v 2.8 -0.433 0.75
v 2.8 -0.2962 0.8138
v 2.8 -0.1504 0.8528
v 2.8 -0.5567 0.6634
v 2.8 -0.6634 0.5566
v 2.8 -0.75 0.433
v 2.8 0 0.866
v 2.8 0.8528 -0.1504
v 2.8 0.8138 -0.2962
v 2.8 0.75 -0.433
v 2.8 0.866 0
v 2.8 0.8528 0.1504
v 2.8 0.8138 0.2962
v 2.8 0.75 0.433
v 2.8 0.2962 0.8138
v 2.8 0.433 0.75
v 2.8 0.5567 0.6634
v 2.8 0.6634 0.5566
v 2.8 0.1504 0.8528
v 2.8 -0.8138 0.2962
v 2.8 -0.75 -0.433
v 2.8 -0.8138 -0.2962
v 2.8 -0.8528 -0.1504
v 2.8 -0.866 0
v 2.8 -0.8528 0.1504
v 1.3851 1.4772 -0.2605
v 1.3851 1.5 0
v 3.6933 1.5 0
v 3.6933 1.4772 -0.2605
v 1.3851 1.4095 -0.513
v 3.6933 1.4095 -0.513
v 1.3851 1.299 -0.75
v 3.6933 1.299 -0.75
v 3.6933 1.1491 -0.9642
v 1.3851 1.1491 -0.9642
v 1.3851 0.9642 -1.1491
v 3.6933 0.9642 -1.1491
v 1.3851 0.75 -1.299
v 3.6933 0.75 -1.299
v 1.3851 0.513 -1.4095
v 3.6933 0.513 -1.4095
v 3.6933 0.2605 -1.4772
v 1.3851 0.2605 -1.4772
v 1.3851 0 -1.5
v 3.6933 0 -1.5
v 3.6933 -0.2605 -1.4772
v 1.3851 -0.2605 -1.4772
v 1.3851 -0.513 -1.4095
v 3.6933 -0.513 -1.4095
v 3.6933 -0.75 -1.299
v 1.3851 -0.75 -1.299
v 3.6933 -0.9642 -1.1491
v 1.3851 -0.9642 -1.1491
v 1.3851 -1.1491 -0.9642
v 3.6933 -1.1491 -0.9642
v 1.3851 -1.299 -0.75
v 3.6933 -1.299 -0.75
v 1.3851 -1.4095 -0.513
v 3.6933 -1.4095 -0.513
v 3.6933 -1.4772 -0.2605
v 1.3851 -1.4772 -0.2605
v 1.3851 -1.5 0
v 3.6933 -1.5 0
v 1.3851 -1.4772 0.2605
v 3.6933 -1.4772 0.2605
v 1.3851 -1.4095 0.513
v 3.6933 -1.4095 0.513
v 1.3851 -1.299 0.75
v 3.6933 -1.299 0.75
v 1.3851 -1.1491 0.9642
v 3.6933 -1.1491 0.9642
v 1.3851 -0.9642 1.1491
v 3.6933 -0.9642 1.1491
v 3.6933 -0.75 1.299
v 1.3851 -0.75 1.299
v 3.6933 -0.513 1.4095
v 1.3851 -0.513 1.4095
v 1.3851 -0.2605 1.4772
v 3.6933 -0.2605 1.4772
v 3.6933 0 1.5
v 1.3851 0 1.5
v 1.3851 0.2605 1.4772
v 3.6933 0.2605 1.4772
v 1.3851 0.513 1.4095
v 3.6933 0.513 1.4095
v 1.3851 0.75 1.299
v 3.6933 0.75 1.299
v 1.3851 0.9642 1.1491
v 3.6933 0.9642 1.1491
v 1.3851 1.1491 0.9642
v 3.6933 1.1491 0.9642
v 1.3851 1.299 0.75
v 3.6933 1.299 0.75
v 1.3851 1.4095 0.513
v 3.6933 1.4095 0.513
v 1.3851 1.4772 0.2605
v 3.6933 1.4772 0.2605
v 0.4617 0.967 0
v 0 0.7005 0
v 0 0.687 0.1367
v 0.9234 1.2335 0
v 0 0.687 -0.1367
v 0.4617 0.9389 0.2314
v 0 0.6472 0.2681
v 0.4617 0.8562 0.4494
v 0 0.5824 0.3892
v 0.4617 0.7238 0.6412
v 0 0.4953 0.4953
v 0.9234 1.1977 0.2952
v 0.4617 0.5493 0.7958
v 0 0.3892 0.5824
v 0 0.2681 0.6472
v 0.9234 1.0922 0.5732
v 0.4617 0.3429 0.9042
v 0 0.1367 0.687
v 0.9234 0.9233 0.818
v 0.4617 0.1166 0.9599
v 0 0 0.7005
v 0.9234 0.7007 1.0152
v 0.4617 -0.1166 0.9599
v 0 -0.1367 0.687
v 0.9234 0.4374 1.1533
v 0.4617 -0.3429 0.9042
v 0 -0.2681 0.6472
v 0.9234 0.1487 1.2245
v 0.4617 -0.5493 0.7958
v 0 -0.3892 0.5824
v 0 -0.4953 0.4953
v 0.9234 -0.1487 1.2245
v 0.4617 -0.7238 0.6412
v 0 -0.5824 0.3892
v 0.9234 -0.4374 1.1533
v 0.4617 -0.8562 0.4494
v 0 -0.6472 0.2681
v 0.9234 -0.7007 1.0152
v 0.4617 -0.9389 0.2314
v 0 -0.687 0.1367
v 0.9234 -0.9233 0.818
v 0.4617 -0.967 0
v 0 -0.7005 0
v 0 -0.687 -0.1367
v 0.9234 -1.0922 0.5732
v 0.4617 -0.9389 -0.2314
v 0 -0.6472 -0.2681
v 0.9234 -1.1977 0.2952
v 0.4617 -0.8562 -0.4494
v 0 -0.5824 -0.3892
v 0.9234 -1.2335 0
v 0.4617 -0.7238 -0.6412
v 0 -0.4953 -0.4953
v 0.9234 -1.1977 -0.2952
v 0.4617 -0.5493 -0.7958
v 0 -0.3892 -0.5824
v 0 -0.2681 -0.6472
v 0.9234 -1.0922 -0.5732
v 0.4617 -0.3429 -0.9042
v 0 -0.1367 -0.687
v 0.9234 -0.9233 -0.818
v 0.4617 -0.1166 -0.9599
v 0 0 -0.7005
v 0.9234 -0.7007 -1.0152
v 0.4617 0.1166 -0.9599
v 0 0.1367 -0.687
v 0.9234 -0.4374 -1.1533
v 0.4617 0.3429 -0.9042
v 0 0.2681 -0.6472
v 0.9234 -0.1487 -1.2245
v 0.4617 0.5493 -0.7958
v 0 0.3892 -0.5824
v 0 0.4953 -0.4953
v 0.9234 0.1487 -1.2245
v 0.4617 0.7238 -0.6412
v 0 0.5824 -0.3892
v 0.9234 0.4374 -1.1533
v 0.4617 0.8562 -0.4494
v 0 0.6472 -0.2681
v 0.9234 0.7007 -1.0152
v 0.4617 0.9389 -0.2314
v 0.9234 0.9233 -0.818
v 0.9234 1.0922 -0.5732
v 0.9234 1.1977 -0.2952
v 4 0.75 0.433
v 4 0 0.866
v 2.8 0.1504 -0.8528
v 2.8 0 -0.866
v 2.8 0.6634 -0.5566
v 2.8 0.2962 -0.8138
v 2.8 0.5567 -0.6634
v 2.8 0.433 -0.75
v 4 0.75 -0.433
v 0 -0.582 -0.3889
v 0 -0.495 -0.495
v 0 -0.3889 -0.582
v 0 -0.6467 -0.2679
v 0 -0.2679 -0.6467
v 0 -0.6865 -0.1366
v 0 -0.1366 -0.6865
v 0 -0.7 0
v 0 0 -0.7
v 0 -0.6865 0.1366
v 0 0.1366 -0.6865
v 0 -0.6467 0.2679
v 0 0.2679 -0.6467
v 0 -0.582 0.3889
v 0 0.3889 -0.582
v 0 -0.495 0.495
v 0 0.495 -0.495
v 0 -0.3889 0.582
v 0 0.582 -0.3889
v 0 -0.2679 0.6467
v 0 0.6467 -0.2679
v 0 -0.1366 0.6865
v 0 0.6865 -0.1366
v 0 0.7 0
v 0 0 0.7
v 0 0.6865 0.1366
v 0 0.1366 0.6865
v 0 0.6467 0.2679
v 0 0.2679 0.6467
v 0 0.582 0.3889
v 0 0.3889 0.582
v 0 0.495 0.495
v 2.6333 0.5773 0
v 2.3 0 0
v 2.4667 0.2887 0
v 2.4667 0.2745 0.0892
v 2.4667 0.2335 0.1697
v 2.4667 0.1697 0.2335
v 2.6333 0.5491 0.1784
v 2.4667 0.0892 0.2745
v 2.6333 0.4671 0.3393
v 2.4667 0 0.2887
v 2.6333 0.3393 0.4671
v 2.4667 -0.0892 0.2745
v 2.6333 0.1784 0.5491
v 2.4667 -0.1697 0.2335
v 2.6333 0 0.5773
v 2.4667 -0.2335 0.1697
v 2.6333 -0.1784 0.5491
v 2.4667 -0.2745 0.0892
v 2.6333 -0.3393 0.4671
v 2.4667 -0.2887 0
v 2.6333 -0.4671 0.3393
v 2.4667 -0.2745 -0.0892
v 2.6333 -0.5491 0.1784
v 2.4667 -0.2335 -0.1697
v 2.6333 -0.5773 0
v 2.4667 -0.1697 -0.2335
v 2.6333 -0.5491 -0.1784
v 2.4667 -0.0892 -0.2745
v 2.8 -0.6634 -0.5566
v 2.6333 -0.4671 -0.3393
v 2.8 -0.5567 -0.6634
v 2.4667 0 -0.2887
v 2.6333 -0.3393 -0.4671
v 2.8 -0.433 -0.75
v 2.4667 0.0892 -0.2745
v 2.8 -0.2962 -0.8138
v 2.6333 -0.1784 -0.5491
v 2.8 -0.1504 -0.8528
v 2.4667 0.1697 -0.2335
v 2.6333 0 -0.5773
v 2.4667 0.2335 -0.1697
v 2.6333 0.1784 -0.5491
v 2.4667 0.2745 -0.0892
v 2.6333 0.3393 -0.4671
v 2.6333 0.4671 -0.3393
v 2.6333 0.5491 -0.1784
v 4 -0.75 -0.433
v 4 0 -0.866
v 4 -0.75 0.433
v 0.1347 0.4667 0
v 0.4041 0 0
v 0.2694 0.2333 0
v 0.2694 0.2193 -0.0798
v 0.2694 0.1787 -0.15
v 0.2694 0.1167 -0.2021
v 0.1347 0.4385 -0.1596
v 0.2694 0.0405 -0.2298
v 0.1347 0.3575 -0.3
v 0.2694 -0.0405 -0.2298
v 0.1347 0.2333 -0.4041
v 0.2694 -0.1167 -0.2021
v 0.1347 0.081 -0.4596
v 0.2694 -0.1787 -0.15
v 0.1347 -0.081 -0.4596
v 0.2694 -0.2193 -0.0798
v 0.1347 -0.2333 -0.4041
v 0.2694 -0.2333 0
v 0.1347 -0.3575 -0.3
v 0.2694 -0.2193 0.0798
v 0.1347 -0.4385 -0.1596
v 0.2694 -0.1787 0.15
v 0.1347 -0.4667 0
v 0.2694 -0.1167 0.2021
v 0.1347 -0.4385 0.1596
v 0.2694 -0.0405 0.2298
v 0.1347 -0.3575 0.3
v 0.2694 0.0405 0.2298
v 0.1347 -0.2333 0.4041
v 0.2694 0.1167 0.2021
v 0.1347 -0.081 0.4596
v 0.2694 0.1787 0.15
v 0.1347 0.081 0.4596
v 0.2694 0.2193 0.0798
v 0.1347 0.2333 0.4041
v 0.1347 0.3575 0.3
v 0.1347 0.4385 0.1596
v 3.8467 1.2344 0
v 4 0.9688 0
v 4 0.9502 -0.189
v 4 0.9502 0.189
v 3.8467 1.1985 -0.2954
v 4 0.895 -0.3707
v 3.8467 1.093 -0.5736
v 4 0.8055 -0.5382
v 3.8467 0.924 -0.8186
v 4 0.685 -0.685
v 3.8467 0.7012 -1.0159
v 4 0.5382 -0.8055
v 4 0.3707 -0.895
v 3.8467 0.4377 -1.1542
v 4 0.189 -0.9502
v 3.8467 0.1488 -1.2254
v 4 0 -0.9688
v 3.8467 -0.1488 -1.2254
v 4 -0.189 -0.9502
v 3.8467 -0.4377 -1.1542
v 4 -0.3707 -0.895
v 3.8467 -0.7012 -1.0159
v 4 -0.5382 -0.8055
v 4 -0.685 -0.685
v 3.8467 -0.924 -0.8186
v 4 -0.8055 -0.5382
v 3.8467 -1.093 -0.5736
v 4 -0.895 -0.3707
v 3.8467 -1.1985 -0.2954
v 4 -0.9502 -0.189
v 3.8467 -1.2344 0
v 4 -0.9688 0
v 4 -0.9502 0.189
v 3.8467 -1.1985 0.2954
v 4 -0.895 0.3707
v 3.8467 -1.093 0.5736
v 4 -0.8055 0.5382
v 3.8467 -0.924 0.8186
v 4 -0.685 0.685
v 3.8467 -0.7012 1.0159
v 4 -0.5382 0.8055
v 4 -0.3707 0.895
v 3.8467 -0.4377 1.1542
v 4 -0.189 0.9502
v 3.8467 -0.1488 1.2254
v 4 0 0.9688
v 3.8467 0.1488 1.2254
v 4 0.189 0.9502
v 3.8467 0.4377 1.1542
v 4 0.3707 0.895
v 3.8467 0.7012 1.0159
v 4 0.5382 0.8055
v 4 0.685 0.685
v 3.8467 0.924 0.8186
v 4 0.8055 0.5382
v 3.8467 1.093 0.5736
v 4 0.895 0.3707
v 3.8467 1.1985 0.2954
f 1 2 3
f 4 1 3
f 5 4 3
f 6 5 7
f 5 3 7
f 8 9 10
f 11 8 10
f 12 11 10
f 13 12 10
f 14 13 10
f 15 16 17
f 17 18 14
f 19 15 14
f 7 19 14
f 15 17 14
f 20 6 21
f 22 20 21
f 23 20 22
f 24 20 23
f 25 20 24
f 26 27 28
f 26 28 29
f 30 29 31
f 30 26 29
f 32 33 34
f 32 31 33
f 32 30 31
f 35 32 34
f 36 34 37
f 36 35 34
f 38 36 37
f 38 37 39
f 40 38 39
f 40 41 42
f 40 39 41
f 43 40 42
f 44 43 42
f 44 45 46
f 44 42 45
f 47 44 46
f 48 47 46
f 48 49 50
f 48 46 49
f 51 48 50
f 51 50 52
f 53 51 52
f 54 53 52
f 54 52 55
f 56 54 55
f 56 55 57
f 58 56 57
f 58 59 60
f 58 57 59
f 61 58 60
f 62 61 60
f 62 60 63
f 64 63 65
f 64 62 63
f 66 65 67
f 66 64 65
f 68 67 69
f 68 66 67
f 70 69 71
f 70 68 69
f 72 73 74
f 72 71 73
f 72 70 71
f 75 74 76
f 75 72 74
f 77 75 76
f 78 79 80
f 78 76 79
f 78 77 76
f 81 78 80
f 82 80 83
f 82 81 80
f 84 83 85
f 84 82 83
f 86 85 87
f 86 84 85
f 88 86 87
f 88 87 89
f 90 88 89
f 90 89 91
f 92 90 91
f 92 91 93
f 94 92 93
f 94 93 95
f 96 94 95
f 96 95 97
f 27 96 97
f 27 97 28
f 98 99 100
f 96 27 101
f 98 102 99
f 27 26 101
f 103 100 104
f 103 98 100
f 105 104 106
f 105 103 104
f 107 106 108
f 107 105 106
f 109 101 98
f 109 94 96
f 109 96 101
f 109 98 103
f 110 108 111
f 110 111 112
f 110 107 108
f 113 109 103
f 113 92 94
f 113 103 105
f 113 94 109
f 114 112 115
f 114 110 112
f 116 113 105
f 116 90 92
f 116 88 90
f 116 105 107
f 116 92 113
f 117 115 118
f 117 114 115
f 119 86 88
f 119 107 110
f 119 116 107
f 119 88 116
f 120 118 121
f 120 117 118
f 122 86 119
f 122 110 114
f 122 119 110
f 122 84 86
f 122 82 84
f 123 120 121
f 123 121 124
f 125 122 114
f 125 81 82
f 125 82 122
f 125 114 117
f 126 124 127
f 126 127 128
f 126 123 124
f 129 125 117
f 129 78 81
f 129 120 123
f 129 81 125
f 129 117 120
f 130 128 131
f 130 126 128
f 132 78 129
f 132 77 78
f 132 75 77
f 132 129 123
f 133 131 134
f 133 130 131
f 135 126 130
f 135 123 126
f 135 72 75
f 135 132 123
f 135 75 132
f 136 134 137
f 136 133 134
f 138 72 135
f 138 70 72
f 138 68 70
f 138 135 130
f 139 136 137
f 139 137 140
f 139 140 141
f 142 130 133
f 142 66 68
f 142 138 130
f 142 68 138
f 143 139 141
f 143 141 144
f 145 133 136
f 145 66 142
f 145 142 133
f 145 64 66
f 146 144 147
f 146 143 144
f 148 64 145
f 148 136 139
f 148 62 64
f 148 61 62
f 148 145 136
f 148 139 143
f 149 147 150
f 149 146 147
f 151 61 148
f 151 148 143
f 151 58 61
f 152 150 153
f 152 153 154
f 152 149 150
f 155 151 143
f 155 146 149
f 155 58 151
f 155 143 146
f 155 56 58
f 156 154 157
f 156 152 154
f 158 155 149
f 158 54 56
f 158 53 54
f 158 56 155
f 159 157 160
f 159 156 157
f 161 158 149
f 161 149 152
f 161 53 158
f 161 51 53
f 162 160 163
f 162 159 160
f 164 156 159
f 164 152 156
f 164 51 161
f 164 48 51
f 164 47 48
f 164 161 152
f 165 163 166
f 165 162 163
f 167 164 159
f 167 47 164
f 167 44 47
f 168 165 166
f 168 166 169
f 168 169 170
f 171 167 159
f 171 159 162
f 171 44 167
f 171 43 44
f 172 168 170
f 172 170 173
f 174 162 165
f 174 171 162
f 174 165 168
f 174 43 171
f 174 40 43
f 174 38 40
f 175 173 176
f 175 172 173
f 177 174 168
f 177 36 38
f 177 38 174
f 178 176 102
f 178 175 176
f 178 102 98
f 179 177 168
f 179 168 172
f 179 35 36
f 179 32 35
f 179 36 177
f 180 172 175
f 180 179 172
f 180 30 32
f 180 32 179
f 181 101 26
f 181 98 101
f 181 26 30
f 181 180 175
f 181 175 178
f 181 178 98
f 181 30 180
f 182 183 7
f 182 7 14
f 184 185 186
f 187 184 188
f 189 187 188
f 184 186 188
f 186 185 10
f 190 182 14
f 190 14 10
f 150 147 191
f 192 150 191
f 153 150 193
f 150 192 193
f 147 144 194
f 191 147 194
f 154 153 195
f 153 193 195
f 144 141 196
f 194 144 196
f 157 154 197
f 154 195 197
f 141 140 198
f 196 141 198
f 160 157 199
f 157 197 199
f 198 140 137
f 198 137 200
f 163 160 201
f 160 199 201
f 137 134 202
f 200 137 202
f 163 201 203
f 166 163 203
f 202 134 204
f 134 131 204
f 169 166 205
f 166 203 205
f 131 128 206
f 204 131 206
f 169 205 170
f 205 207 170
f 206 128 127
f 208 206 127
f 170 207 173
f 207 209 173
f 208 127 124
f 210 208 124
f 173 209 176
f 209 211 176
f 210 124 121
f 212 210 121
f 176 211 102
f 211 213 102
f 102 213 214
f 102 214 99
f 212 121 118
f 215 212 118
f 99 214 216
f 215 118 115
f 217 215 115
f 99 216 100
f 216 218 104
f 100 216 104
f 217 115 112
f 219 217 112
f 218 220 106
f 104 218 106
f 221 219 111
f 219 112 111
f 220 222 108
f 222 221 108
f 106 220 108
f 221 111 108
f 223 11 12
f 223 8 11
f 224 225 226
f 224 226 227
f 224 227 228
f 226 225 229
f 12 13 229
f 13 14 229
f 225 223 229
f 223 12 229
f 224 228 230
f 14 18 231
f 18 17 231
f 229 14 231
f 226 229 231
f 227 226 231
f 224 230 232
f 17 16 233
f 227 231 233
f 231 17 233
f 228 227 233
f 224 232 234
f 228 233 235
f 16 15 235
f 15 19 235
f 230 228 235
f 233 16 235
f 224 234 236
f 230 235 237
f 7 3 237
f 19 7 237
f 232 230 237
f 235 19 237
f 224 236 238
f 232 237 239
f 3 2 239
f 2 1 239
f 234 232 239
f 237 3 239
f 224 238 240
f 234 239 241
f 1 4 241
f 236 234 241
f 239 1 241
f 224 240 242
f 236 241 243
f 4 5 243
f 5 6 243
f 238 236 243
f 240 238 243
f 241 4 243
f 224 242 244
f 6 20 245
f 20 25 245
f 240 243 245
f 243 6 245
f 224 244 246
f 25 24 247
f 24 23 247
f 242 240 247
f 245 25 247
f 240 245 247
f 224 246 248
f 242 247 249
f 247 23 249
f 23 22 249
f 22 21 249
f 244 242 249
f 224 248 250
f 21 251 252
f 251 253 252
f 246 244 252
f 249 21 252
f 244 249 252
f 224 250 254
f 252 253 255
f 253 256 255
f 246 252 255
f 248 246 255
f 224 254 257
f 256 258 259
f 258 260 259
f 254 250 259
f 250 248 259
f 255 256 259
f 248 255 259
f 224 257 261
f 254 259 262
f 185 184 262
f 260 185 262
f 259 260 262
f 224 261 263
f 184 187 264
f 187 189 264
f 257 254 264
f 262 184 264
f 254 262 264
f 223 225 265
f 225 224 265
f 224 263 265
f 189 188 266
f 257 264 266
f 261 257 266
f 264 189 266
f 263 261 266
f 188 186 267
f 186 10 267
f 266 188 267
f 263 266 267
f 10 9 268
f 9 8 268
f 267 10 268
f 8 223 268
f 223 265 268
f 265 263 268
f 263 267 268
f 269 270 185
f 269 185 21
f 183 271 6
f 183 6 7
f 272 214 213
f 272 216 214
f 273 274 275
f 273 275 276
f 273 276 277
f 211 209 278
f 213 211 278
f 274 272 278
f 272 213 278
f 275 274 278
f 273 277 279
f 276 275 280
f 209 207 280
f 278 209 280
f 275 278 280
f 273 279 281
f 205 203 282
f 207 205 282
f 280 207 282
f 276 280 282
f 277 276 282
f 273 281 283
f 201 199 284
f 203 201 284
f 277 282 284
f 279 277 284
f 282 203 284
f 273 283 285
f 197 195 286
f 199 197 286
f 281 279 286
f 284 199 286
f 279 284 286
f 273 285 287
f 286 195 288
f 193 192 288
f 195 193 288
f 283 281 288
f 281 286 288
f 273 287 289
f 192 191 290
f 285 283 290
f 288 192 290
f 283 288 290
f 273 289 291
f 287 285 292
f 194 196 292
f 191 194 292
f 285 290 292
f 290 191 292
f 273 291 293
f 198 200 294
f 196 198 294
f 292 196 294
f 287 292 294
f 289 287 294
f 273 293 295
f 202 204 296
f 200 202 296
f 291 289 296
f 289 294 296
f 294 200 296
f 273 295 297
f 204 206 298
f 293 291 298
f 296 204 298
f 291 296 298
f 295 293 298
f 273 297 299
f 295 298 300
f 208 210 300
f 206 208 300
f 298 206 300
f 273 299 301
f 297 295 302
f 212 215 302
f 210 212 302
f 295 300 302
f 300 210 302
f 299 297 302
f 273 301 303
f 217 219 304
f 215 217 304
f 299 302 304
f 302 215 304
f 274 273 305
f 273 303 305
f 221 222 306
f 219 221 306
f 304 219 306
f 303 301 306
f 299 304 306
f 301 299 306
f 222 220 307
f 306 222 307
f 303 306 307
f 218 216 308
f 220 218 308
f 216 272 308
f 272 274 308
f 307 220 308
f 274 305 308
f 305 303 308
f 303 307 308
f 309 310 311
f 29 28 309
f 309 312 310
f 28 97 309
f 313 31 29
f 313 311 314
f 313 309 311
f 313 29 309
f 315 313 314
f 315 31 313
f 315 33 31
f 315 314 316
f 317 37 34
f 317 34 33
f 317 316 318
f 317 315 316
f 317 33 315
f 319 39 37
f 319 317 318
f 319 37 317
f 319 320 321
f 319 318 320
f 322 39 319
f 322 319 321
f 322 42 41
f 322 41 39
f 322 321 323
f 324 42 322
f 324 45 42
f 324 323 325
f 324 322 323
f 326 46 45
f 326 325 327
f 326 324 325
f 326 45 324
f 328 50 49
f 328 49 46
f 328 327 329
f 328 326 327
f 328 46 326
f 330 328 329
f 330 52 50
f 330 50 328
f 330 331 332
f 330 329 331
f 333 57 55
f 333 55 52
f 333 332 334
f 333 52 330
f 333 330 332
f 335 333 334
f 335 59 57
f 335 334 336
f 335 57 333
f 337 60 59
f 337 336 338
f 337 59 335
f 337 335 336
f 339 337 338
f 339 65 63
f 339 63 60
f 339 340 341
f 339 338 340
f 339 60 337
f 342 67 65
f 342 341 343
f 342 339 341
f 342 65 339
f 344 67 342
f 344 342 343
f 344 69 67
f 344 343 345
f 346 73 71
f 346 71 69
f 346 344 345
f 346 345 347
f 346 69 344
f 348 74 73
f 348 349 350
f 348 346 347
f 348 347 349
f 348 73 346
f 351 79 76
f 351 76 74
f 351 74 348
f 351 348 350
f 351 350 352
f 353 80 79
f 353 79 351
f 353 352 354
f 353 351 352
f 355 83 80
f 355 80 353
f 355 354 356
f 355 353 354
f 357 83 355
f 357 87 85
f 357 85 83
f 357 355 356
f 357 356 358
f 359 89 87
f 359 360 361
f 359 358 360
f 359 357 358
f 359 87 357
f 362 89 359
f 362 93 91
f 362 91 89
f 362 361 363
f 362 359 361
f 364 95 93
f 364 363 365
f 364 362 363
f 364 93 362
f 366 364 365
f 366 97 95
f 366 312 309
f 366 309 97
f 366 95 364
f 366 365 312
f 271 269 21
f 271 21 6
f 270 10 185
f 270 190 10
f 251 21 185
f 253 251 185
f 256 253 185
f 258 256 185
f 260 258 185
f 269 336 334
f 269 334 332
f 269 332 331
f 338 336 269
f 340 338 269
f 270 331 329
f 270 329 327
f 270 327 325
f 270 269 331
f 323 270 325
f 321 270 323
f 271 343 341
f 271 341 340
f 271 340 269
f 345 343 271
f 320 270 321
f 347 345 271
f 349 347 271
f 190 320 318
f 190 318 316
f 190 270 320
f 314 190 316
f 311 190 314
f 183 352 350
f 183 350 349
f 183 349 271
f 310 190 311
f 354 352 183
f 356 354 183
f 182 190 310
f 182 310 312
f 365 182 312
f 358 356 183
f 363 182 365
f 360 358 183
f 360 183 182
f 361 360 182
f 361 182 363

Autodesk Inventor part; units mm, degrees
ref_plane "YZ Plane" through (0, 0, 0) normal (1, 0, 0) x (0, 1, 0)
ref_plane "XZ Plane" through (0, 0, 0) normal (0, 1, 0) x (-1, 0, 0)
sketch "Sketch1" plane through (0, 0, 0) normal (0, 0, 1) x (1, 0, 0)
  line L0 (0.4041, 0) -> (2.3, 0)
  line L1 (4, 0.866) -> (4, 1.5)
  line L2 (4, 1.5) -> (0, 1.5)
  line L3 (4, 0.866) -> (2.8, 0.866)
  line L4 (2.8, 0.866) -> (2.3, 0)
  line L5 (0, 0.7) -> (0.4041, 0)
  line L6 (0, -0.3) -> (0, 1.8) projected
  line L7 (0, 0.7) -> (0, 1.5)
  point P0 (0, 0)
  dimension "d0" = 1.2
  dimension "d1" = 60
  dimension "d2" = 3
  dimension "d3" = 1.7321
  dimension "d4" = 4
  dimension "d5" = 60
  dimension "d7" = 1.4
revolve "Body" add sketch "Sketch1" angle 360 about axis through (0.4041, 0, 0) along (1, 0, 0)
sketch "Sketch2" plane through (4, 0, 0) normal (1, 0, 0) x (0, 0, -1)
  circle A0 centre (0, 0) radius 0.866 projected
  circle A1 centre (0, 0) radius 1.5 projected
  line L0 (0.866, 0) -> (0.433, -0.75)
  line L1 (0.433, -0.75) -> (-0.433, -0.75)
  line L2 (-0.433, -0.75) -> (-0.866, 0)
  line L3 (-0.866, 0) -> (-0.433, 0.75)
  line L4 (-0.433, 0.75) -> (0.433, 0.75)
  line L5 (0.433, 0.75) -> (0.866, 0)
extrude "Slot" add sketch "Sketch2" against normal blind 1.2 contours L5 A0 | A0 L0 | L4 A0 | A0 L1 | L3 A0 | A0 L2
chamfer "Chamfer1" distance 0.8 angle 60 1 edges at (0, -1.5, 0) measured on face at (0, 1.2188, -0.1197)
thread "Thread" size "M3x0.5" class "6g" standard "ISO Metric profile" length 4
chamfer "Chamfer2" distance 0.3067 angle 60 1 edges at (4, -1.5, 0) measured on face at (2.2568, 1.4806, -0.2406)
ref_plane "Work Plane1" through (2, 0, 0) normal (0, -0.5, -0.866) x (1, 0, 0)
equation "\"d0\" = INTI"
equation "\"d2\" = NND"
equation "\"d3\" = 1.1547 * SW"
equation "\"d4\" = NLG"
equation "\"d5\" = 0.5 * ANG"
equation "\"d7\" = SPD"
equation "\"d8\" = INTI"
equation "\"d10\" = -0.5 * SPD + 0.5 * NND"
equation "\"d11\" = FAWI"
equation "\"d33\" = -0.5 * SPD + 0.5 * NND"
equation "\"d14\" = NLG"
equation "\"d12\" = -0.5 * GD1 + 0.5 * NND"
equation "\"d13\" = FAWI"
equation "\"d34\" = -0.5 * GD1 + 0.5 * NND"
equation "\"NND\" = 3"
equation "\"NLG\" = 4"
equation "\"INTI\" = 1.2"
equation "\"FAWI\" = 60deg"
equation "\"SW\" = 1.5"
equation "\"GD1\" = THREADDIA - 1.2269 * PTC"
equation "\"ANG\" = 120deg"
equation "\"FAWI1\" = 45deg"
equation "\"SPD\" = 1.4"
equation "\"GUL\" = 0.61345 * PTC"
equation "\"TOA\" = 30deg"
equation "\"THREADDIA\" = 3"
equation "\"PTC\" = 0.5"
equation "\"GAL\" = 0.61345 * PTC"
equation "\"E0\" = 1.155 * SW"
properties part number "DIN EN ISO 4029 - M3  x  4" material "Steel, Mild"
